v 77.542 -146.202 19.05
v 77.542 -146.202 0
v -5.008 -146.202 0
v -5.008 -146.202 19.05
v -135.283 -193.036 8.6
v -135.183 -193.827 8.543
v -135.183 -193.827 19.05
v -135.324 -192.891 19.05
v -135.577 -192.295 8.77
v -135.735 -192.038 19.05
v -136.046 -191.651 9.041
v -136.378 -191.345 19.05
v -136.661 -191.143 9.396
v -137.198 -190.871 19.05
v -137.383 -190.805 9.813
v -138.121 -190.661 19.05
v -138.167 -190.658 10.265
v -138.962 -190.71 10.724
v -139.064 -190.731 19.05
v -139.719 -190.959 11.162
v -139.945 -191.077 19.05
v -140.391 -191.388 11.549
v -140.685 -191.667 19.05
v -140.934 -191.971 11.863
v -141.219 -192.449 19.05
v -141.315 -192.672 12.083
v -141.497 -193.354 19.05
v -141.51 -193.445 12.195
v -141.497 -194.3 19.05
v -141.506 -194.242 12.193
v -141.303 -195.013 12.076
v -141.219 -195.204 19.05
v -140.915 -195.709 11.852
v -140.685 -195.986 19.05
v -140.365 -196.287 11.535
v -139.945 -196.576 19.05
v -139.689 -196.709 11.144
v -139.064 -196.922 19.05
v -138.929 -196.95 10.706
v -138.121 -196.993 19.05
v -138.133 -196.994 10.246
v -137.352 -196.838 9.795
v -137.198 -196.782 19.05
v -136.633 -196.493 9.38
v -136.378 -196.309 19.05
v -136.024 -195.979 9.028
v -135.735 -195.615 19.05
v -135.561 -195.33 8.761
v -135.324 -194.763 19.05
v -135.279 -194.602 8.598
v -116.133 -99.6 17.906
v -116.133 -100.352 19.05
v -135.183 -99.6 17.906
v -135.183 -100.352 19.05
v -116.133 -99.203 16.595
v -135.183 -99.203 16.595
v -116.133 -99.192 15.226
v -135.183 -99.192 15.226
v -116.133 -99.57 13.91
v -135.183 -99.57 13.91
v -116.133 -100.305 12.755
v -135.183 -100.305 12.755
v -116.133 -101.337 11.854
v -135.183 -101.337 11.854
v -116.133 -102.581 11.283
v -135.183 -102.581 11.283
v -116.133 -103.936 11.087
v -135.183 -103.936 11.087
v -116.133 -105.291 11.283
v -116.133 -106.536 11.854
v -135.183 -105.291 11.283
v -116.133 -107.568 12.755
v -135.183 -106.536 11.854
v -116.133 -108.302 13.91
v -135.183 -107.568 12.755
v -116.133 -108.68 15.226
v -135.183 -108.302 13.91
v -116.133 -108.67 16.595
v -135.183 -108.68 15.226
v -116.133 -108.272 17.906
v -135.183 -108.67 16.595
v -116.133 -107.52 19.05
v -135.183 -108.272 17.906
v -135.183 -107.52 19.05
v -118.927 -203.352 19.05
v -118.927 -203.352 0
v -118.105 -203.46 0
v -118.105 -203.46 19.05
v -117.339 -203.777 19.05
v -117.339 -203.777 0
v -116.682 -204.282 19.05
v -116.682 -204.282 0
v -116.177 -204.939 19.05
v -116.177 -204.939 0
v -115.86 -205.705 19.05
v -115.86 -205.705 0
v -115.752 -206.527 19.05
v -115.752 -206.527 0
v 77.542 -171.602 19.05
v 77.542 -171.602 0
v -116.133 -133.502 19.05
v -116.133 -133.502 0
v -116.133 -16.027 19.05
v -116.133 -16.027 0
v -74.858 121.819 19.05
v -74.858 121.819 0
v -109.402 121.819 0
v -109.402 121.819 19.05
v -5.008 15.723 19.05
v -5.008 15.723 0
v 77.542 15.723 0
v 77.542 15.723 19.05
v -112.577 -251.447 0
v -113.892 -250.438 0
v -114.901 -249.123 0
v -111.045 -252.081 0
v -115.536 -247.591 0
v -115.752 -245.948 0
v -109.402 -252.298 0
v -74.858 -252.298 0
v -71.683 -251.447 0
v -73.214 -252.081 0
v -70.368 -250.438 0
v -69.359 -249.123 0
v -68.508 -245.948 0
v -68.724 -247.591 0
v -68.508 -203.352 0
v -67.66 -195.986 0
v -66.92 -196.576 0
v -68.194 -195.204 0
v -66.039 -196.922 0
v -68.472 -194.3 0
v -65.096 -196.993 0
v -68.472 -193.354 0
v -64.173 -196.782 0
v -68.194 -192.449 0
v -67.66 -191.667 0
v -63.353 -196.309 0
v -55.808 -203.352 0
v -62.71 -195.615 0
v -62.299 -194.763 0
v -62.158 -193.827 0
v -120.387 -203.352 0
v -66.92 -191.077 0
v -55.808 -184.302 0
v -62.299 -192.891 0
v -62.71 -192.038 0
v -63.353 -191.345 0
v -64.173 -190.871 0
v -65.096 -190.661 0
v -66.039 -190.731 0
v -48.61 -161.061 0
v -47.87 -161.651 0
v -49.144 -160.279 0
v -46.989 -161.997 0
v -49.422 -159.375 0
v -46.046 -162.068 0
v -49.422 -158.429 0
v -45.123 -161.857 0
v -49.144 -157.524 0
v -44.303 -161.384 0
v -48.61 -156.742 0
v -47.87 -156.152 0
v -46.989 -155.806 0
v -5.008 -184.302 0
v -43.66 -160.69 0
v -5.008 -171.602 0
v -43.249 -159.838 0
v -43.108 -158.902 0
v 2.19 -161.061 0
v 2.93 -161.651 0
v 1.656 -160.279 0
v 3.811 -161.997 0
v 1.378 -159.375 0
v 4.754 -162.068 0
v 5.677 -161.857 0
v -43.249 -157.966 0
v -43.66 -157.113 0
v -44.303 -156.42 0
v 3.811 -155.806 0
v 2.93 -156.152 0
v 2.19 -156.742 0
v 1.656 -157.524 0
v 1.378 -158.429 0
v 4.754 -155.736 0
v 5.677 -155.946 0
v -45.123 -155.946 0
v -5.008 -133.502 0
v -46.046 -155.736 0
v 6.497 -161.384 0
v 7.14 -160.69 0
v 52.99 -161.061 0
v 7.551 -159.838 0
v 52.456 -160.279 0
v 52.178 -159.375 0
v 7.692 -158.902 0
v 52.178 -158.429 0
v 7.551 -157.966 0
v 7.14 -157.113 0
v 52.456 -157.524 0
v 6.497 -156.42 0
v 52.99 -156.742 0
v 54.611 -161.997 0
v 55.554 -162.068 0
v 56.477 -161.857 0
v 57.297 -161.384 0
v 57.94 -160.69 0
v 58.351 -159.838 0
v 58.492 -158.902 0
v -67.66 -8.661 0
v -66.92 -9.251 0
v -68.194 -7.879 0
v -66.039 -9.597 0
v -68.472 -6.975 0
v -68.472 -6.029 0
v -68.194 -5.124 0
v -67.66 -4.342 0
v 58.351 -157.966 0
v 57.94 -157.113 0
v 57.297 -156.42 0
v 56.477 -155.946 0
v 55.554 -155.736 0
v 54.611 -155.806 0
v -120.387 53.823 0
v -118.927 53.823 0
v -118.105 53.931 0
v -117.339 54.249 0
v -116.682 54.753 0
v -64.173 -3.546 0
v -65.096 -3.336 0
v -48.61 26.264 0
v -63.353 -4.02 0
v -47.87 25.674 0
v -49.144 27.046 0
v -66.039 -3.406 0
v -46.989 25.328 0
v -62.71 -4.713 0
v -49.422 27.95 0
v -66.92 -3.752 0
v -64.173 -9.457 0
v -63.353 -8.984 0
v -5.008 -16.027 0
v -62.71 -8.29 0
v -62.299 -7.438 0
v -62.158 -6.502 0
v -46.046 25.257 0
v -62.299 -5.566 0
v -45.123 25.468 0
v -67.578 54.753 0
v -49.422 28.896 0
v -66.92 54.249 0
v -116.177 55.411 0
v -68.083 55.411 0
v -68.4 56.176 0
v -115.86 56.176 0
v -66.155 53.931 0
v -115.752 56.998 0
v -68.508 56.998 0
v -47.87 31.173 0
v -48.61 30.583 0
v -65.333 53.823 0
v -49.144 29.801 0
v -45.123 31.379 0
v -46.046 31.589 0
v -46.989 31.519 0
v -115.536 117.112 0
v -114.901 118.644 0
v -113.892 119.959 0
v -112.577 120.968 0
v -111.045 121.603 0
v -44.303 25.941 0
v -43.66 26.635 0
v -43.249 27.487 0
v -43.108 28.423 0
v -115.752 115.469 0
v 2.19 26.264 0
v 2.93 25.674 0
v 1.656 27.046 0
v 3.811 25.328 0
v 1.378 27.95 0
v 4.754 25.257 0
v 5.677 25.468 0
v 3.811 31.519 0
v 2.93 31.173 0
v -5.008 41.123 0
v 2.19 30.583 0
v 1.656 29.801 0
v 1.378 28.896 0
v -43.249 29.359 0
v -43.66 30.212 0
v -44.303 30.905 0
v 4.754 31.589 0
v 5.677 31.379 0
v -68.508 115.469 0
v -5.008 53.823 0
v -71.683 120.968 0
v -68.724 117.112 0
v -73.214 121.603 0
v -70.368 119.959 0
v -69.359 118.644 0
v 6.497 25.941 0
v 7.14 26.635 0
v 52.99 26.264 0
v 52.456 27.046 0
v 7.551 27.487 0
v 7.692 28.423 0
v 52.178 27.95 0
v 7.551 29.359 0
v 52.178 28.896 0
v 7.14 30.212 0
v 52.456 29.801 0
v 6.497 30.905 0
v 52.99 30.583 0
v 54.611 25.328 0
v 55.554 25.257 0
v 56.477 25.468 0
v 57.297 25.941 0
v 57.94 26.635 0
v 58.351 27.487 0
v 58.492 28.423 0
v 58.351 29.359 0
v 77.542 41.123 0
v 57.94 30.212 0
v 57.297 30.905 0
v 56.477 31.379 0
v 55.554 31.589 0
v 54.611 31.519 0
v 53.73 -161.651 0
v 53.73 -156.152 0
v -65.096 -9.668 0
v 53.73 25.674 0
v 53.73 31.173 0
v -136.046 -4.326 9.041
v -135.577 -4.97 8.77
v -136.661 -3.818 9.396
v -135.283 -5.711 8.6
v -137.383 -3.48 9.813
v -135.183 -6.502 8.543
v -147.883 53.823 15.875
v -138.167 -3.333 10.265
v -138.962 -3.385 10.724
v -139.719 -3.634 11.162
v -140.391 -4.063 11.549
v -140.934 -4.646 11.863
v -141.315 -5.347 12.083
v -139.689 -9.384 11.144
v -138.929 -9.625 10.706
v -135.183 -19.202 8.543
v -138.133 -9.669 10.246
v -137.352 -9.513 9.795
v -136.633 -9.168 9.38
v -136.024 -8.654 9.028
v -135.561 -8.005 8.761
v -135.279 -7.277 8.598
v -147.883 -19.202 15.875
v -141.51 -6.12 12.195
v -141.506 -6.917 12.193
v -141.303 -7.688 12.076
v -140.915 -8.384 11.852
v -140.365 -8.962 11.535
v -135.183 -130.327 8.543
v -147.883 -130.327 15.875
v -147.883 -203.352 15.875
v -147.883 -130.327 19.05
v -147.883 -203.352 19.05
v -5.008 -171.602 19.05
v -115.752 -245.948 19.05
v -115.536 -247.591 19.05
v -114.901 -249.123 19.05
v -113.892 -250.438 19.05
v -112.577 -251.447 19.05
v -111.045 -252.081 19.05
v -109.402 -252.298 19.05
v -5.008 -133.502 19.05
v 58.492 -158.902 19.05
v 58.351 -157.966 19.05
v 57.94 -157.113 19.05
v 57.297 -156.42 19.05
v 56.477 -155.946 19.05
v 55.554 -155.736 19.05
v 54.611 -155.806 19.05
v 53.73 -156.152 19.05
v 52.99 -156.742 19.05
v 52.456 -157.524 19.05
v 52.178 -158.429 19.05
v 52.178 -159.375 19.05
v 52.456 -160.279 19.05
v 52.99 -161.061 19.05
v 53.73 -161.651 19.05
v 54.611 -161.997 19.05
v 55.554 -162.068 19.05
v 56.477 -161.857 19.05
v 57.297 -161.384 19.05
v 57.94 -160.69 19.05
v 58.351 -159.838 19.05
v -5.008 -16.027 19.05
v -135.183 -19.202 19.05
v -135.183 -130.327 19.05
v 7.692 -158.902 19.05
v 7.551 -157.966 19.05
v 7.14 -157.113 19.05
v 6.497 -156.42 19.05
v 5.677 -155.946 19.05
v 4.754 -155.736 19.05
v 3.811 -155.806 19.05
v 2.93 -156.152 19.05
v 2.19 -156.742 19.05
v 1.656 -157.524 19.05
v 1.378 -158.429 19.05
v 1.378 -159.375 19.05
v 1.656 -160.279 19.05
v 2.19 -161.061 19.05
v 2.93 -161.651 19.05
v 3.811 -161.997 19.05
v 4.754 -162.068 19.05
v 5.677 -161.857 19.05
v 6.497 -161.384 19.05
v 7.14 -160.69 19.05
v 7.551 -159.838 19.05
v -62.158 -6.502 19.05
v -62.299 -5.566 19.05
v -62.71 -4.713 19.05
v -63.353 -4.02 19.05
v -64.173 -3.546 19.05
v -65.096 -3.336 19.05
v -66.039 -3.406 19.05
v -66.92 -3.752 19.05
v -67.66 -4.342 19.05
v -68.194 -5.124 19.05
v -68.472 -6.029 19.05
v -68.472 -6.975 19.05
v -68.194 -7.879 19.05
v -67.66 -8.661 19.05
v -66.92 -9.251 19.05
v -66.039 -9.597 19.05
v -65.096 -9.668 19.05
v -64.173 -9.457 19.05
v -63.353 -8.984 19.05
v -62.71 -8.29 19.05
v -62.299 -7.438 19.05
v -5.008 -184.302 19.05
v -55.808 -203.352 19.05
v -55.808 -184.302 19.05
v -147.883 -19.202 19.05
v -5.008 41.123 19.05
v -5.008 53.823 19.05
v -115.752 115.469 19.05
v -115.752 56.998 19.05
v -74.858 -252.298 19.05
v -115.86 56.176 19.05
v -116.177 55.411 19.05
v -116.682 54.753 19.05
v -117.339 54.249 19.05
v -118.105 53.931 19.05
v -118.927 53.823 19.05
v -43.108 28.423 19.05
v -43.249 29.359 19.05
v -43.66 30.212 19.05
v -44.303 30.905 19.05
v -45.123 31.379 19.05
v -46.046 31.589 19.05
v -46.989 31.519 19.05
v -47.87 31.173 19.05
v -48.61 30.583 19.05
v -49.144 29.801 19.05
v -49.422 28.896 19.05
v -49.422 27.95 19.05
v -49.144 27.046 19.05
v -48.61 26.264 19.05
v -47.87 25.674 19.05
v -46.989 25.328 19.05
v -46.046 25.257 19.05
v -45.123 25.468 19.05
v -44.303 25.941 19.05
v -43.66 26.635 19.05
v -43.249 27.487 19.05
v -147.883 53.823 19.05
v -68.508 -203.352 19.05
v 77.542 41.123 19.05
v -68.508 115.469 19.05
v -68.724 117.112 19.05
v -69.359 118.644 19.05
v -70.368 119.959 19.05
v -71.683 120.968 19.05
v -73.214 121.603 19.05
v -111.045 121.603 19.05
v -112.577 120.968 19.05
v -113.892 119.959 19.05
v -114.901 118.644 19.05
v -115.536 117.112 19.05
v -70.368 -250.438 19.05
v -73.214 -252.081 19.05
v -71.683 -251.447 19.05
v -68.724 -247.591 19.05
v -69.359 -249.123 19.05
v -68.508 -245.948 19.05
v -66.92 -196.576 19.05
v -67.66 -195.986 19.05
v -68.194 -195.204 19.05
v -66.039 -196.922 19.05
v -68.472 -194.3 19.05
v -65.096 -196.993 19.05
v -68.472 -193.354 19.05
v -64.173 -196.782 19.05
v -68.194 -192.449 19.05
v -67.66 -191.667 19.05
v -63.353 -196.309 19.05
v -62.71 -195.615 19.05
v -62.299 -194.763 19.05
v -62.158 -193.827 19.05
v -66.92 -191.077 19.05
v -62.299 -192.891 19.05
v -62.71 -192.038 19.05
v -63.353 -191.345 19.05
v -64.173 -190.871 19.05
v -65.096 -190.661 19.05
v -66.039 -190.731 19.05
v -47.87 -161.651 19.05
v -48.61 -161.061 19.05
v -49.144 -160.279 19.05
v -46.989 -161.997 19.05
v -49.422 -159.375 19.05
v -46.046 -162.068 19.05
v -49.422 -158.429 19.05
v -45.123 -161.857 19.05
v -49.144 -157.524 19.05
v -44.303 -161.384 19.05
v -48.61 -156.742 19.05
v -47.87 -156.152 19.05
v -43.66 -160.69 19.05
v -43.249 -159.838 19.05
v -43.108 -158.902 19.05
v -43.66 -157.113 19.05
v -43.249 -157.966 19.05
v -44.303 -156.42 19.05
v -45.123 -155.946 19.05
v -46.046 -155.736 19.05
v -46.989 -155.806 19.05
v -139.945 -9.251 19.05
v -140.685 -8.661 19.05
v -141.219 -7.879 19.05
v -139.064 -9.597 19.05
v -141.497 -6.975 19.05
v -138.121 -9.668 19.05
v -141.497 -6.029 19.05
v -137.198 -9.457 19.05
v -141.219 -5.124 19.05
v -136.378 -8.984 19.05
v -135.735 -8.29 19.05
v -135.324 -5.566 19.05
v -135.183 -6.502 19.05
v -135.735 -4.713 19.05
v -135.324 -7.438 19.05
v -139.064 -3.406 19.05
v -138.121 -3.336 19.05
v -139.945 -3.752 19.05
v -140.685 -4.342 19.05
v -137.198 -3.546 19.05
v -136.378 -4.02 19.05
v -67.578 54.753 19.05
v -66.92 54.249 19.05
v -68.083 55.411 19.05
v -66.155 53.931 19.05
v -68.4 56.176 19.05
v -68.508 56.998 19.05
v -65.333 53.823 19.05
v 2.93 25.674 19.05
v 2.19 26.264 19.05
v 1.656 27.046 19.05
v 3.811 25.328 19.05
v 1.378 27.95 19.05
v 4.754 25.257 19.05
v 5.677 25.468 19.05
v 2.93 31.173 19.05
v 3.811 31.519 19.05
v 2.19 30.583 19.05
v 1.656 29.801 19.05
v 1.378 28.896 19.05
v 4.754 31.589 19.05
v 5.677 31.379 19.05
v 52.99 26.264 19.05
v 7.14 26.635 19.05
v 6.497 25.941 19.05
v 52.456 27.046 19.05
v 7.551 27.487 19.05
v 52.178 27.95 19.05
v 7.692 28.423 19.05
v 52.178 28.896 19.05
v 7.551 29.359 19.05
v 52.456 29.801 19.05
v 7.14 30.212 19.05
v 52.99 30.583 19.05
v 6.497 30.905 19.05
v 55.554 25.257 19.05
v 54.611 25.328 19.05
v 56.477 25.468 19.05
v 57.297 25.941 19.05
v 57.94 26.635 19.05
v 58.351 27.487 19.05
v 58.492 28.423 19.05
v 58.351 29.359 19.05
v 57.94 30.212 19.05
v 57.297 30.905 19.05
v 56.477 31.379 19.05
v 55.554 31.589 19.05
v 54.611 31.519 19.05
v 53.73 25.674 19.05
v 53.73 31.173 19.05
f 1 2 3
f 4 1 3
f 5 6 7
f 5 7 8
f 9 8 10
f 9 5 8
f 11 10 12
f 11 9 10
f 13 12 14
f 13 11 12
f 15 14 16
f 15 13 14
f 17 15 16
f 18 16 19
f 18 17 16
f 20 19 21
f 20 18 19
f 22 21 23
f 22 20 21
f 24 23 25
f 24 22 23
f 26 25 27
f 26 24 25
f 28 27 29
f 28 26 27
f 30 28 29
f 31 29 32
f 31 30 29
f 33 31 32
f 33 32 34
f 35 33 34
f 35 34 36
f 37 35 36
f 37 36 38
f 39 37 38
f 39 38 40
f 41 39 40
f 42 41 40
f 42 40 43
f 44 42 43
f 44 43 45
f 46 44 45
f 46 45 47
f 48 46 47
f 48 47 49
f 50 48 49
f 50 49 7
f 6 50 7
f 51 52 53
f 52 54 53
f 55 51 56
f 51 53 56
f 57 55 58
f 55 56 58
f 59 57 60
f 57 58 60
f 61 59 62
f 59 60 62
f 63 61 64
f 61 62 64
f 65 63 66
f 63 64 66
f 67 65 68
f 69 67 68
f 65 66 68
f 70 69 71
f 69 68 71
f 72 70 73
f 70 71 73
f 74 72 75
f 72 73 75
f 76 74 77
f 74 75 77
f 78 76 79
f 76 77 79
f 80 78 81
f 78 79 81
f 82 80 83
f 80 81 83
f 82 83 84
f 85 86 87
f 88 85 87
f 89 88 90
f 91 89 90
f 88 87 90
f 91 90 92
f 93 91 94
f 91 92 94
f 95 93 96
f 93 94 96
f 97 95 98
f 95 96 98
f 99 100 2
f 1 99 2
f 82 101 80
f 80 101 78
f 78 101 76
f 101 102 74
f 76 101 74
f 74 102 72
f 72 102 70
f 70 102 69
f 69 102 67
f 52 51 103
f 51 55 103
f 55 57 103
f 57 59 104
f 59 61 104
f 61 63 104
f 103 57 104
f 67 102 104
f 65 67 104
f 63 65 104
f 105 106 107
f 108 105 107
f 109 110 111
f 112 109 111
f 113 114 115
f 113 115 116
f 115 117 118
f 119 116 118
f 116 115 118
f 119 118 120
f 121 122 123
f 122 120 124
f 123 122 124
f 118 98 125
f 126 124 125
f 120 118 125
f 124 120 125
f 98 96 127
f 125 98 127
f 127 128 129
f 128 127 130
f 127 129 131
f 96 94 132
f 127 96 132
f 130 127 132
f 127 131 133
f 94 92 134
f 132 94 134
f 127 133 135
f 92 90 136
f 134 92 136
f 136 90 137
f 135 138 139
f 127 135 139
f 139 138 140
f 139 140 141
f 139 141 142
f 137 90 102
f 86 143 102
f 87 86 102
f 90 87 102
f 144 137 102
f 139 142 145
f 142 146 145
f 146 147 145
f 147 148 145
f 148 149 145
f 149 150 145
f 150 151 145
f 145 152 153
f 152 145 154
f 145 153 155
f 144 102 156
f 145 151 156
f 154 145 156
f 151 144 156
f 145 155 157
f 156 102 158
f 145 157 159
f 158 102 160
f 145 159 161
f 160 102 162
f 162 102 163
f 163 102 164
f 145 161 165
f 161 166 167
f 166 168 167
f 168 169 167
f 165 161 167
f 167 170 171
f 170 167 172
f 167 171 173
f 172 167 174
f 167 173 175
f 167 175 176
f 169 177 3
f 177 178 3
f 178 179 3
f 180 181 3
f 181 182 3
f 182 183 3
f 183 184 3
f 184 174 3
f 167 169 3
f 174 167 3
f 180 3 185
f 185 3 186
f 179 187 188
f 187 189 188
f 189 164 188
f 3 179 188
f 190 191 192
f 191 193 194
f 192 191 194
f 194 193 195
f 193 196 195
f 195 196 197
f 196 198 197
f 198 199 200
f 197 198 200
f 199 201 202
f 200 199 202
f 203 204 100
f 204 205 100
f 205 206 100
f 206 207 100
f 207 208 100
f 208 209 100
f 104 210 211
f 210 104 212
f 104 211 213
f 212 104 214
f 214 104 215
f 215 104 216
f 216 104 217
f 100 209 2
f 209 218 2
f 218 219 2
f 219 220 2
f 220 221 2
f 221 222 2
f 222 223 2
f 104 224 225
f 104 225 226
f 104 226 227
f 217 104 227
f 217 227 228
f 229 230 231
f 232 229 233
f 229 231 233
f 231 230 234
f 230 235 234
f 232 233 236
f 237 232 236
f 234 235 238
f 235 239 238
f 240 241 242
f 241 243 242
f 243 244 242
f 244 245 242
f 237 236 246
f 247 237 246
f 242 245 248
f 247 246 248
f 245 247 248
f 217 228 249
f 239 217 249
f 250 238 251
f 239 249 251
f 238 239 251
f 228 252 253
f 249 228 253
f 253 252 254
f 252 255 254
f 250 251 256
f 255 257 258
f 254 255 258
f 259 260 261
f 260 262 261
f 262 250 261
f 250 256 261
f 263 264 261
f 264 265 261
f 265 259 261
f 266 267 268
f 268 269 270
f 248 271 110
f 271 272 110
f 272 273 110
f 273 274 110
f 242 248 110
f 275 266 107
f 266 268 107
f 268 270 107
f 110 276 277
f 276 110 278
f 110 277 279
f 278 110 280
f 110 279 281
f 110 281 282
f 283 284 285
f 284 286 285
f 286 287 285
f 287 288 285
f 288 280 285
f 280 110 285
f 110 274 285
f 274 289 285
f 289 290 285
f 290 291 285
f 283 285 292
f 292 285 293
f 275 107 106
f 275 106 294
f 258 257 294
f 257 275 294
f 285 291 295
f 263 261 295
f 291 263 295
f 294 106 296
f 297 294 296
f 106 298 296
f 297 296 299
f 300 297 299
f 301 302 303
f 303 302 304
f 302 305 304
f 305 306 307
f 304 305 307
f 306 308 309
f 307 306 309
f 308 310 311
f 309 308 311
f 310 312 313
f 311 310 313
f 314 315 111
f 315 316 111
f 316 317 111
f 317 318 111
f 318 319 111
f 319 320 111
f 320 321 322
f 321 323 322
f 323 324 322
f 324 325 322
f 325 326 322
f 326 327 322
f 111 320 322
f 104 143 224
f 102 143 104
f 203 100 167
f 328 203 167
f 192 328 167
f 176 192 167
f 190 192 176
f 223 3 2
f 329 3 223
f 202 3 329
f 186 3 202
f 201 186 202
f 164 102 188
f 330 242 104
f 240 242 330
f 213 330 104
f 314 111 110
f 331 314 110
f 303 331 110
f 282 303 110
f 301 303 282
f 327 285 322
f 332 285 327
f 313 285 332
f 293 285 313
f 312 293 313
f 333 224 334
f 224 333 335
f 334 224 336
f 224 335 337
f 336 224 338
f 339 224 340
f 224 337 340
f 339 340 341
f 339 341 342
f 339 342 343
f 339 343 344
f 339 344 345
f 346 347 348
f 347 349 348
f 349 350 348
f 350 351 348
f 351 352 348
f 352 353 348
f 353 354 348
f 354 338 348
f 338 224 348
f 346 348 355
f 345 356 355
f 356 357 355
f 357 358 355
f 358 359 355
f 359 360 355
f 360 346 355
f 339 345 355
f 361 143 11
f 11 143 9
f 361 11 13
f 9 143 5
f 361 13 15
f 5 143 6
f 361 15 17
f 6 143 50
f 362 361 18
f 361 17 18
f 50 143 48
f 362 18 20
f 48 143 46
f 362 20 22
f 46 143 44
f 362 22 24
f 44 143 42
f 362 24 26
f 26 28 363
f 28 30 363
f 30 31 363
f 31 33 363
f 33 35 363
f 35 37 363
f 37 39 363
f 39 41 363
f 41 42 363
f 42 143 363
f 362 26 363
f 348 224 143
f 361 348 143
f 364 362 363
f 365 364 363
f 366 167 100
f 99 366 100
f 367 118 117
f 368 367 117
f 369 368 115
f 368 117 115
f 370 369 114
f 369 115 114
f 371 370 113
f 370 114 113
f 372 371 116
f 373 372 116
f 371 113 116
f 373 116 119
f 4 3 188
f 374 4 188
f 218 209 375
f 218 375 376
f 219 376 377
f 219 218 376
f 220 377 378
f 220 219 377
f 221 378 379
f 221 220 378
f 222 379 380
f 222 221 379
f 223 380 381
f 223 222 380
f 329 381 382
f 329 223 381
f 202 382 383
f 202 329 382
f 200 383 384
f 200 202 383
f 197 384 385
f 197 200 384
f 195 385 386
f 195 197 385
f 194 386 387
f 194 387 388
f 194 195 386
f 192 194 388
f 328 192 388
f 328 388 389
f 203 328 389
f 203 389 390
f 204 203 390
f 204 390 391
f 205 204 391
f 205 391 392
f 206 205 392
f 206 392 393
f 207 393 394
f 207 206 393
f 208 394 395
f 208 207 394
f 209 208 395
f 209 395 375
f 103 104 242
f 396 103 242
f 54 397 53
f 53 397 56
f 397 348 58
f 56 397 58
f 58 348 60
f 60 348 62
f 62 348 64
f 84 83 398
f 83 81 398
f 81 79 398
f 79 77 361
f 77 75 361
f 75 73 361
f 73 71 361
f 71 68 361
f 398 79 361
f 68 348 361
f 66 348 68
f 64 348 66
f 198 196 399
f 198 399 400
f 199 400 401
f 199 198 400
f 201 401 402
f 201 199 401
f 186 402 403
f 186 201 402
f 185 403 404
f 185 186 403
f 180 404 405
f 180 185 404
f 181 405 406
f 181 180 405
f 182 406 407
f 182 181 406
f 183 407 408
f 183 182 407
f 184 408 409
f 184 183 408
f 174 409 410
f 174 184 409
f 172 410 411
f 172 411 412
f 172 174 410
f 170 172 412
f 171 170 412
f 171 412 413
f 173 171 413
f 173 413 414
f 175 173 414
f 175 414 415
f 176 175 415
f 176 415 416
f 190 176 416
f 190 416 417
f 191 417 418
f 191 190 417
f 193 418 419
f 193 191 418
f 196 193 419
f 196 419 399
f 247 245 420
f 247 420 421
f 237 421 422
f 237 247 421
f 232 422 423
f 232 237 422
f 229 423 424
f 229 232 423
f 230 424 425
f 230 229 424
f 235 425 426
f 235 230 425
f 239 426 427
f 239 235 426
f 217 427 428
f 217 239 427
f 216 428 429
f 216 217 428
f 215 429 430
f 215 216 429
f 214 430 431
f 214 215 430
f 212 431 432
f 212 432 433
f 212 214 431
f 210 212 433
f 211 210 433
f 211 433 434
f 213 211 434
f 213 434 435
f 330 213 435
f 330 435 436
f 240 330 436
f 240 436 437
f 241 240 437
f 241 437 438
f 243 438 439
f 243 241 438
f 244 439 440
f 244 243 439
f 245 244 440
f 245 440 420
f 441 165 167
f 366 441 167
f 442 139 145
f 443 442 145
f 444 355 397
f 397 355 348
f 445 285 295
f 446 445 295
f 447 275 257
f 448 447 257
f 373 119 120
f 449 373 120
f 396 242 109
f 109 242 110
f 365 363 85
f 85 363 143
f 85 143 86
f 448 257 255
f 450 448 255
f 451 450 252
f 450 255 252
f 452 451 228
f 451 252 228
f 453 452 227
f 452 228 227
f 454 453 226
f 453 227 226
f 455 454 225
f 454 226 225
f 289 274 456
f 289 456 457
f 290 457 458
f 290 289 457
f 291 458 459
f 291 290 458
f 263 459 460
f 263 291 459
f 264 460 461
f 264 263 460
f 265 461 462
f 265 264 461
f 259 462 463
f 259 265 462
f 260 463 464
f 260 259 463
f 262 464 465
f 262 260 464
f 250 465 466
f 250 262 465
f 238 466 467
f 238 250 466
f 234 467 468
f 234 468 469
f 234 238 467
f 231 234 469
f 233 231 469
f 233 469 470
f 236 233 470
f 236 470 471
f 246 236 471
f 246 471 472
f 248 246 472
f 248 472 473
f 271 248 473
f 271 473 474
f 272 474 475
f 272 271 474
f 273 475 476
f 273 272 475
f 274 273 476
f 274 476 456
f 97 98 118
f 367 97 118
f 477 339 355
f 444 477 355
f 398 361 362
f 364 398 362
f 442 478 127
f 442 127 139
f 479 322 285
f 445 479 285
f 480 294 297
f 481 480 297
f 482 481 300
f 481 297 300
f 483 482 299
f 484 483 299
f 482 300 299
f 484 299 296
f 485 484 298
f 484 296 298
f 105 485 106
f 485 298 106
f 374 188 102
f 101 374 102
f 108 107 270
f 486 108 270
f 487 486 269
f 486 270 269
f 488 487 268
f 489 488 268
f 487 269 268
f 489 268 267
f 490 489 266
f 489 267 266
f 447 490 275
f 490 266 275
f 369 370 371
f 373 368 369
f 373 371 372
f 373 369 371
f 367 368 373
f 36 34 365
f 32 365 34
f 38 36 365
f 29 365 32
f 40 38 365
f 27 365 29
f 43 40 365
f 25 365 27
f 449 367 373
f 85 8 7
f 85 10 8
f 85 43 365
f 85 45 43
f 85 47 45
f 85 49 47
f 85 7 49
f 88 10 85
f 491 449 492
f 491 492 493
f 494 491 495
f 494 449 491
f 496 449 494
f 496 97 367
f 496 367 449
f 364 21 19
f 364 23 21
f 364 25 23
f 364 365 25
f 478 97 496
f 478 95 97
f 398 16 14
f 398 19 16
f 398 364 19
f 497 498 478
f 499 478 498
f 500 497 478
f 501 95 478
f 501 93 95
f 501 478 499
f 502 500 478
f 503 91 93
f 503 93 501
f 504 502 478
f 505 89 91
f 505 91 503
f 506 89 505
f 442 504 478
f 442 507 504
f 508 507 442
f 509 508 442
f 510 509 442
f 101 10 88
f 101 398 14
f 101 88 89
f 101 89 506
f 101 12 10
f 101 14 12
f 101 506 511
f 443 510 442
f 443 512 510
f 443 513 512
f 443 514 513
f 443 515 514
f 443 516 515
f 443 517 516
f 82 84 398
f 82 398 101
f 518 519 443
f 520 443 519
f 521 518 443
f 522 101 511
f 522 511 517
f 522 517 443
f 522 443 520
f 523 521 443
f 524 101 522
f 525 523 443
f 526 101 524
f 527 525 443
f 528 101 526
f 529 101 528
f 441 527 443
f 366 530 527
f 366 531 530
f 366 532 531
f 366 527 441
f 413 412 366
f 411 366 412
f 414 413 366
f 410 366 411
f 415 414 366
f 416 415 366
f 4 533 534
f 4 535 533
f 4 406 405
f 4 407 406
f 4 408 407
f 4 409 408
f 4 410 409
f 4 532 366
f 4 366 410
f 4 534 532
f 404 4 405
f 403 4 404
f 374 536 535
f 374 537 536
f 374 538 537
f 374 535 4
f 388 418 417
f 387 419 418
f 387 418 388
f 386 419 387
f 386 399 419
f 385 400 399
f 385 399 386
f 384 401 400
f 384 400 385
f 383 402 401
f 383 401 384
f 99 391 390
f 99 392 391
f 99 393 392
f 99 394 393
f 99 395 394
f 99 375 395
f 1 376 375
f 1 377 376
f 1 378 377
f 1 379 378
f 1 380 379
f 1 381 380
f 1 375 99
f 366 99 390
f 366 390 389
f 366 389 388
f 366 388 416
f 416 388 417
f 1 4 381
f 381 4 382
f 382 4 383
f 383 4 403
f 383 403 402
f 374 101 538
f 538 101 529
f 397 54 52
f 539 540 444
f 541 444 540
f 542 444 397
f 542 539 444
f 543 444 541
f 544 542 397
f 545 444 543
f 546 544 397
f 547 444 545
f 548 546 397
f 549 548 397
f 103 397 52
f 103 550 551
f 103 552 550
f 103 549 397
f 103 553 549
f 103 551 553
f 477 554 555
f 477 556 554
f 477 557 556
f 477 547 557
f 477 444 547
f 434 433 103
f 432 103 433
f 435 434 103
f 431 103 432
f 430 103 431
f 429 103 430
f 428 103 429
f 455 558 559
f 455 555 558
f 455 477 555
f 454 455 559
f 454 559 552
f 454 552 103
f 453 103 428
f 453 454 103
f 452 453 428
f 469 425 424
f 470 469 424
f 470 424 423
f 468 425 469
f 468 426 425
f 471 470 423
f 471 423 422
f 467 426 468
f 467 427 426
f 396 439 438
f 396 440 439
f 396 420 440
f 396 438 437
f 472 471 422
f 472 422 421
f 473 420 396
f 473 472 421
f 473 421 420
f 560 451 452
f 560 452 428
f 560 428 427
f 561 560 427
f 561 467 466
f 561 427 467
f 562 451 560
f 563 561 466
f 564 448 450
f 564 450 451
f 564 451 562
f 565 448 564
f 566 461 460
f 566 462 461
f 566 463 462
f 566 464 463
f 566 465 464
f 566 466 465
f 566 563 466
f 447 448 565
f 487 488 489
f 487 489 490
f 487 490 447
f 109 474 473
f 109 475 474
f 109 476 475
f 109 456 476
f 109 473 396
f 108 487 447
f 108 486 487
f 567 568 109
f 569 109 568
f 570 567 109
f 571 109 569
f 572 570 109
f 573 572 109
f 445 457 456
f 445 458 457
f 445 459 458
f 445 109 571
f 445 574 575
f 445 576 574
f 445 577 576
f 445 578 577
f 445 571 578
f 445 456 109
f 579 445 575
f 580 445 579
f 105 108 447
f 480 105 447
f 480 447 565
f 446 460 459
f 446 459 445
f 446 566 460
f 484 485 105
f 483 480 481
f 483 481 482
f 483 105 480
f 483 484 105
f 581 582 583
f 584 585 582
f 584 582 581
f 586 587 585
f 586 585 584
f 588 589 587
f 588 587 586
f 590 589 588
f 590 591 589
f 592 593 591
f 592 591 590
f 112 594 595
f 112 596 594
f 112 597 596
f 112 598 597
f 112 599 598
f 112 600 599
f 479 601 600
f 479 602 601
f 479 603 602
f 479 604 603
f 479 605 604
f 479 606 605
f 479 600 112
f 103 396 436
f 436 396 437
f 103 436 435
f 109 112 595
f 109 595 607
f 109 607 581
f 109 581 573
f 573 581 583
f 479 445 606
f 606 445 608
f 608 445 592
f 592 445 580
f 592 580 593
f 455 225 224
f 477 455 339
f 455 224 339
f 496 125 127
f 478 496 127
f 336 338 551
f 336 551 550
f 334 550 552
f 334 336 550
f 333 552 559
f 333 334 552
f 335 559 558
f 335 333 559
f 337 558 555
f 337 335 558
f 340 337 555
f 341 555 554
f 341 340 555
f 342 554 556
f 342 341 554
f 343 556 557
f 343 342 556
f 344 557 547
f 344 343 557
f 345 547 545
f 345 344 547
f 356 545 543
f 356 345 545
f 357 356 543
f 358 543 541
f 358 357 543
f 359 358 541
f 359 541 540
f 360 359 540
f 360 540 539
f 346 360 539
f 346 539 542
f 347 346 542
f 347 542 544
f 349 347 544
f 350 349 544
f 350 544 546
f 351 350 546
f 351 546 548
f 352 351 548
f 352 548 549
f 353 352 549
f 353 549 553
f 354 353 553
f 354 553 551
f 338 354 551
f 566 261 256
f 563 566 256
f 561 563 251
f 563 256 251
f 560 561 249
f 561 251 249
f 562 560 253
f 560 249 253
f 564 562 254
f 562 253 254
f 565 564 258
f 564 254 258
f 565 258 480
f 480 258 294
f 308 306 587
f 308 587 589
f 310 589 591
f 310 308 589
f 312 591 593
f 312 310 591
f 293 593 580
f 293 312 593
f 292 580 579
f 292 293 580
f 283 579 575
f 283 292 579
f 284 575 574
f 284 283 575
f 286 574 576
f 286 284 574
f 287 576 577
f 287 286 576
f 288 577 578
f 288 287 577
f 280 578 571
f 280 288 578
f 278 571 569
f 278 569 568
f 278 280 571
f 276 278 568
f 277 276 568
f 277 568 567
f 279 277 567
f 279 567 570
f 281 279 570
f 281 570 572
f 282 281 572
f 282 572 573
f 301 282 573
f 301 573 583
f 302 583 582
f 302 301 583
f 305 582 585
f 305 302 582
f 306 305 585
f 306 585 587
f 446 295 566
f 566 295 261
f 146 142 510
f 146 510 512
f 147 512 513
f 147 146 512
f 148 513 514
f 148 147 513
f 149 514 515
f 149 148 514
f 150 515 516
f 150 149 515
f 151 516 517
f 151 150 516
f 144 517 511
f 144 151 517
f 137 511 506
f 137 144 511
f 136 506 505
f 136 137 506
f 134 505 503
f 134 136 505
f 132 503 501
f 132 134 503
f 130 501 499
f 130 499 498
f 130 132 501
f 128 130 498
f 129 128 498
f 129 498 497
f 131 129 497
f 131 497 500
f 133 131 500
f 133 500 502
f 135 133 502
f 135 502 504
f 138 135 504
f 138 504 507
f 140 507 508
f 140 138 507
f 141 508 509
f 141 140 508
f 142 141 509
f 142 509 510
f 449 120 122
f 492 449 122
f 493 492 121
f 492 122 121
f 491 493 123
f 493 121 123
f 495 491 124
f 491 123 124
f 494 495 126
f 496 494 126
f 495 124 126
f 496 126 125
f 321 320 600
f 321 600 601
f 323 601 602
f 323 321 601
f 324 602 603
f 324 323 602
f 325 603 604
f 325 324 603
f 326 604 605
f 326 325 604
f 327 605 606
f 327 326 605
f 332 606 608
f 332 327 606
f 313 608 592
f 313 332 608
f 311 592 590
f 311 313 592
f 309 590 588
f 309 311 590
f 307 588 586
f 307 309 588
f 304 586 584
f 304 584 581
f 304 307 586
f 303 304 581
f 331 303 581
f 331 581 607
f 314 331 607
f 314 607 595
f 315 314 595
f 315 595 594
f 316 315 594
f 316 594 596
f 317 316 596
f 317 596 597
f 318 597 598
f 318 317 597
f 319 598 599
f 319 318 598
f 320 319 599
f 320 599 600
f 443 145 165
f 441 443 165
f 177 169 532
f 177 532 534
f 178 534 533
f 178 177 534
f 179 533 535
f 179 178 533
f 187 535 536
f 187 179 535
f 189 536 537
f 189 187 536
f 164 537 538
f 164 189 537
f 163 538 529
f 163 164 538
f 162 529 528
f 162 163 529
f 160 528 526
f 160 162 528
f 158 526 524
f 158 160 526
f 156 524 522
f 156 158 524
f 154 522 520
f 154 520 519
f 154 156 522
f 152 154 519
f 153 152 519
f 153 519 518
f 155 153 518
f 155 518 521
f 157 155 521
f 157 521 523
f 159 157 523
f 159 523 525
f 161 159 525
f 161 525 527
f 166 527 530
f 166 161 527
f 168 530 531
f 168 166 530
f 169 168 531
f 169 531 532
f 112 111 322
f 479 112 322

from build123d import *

# Parameters (mm, degrees)
F0_R     = 3.175
F1_DEPTH = 19.05
F2_R     = 4.7879
F3_DEPTH = 50.8
F5_DEPTH = 279.4


# Not quite as in the source:
# - a feature names something its author has since deleted; it is built from what else it names


with BuildPart() as f1:
    # F0 (on Top) → F1 (new body)
    with BuildSketch(Plane.XY):
        with BuildLine():
            Line((-118.9269337424, 53.8231658584), (-147.8829337424, 53.8231658584))
            Line((-147.8829337424, 53.8231658584), (-147.8829337424, -16.0268341416))
            Line((-147.8829337424, -16.0268341416), (-147.8829337424, -19.2018341416))
            Line((-147.8829337424, -19.2018341416), (-135.1829337424, -19.2018341416))
            Line((-135.1829337424, -19.2018341416), (-135.1829337424, -130.3268341416))
            Line((-135.1829337424, -130.3268341416), (-147.8829337424, -130.3268341416))
            Line((-147.8829337424, -130.3268341416), (-147.8829337424, -136.6768341416))
            Line((-147.8829337424, -136.6768341416), (-147.8829337424, -171.6018341416))
            Line((-147.8829337424, -171.6018341416), (-147.8829337424, -203.3518341416))
            Line((-147.8829337424, -203.3518341416), (-118.9269337424, -203.3518341416))
            ThreePointArc((-118.9269337424, -203.3518341416), (-116.6818697121, -204.2817701113), (-115.7519337424, -206.5268341416))
            Line((-115.7519337424, -206.5268341416), (-115.7519337424, -245.9476341416))
            ThreePointArc((-115.7519337424, -245.9476341416), (-113.8920618029, -250.4377622021), (-109.4019337424, -252.2976341416))
            Line((-109.4019337424, -252.2976341416), (-74.8579337424, -252.2976341416))
            ThreePointArc((-74.8579337424, -252.2976341416), (-70.3678056819, -250.4377622021), (-68.5079337424, -245.9476341416))
            Line((-68.5079337424, -245.9476341416), (-68.5079337424, -203.3518341416))
            Line((-68.5079337424, -203.3518341416), (-55.8079337424, -203.3518341416))
            Line((-55.8079337424, -203.3518341416), (-55.8079337424, -184.3018341416))
            Line((-55.8079337424, -184.3018341416), (-5.0079337424, -184.3018341416))
            Line((-5.0079337424, -184.3018341416), (-5.0079337424, -171.6018341416))
            Line((-5.0079337424, -171.6018341416), (77.5420662576, -171.6018341416))
            Line((77.5420662576, -171.6018341416), (77.5420662576, -146.2018341416))
            Line((77.5420662576, -146.2018341416), (-5.0079337424, -146.2018341416))
            Line((-5.0079337424, -146.2018341416), (-5.0079337424, -133.5018341416))
            Line((-5.0079337424, -133.5018341416), (-27.2329337424, -133.5018341416))
            Line((-27.2329337424, -133.5018341416), (-116.1329337424, -133.5018341416))
            Line((-116.1329337424, -133.5018341416), (-116.1329337424, -16.0268341416))
            Line((-116.1329337424, -16.0268341416), (-22.9684459845, -16.0268341416))
            Line((-22.9684459845, -16.0268341416), (-5.0079337424, -16.0268341416))
            Line((-5.0079337424, -16.0268341416), (-5.0079337424, -7.9982466186))
            Line((-5.0079337424, -7.9982466186), (-5.0079337424, 15.7231658584))
            Line((-5.0079337424, 15.7231658584), (77.5420662576, 15.7231658584))
            Line((77.5420662576, 15.7231658584), (77.5420662576, 41.1231658584))
            Line((77.5420662576, 41.1231658584), (-5.0079337424, 41.1231658584))
            Line((-5.0079337424, 41.1231658584), (-5.0079337424, 53.8231658584))
            Line((-5.0079337424, 53.8231658584), (-65.3329337424, 53.8231658584))
            ThreePointArc((-65.3329337424, 53.8231658584), (-67.5779977727, 54.7531018282), (-68.5079337424, 56.9981658584))
            Line((-68.5079337424, 56.9981658584), (-68.5079337424, 115.4689658584))
            ThreePointArc((-68.5079337424, 115.4689658584), (-70.3678056819, 119.959093919), (-74.8579337424, 121.8189658584))
            Line((-74.8579337424, 121.8189658584), (-109.4019337424, 121.8189658584))
            ThreePointArc((-109.4019337424, 121.8189658584), (-113.8920618029, 119.959093919), (-115.7519337424, 115.4689658584))
            Line((-115.7519337424, 115.4689658584), (-115.7519337424, 56.9981658584))
            ThreePointArc((-115.7519337424, 56.9981658584), (-116.6818697121, 54.7531018282), (-118.9269337424, 53.8231658584))
        make_face()
        with Locations((-138.3579337424, -193.8268341416)):
            Circle(F0_R, mode=Mode.SUBTRACT)
        with Locations((-65.3329337424, -193.8268341416)):
            Circle(F0_R, mode=Mode.SUBTRACT)
        with Locations((-46.2829337424, -158.9018341416)):
            Circle(F0_R, mode=Mode.SUBTRACT)
        with Locations((4.5170662576, -158.9018341416)):
            Circle(F0_R, mode=Mode.SUBTRACT)
        with Locations((55.3170662576, -158.9018341416)):
            Circle(F0_R, mode=Mode.SUBTRACT)
        with Locations((-138.3579337424, -6.5018341416)):
            Circle(F0_R, mode=Mode.SUBTRACT)
        with Locations((-65.3329337424, -6.5018341416)):
            Circle(F0_R, mode=Mode.SUBTRACT)
        with Locations((-46.2829337424, 28.4231658584)):
            Circle(F0_R, mode=Mode.SUBTRACT)
        with Locations((4.5170662576, 28.4231658584)):
            Circle(F0_R, mode=Mode.SUBTRACT)
        with Locations((55.3170662576, 28.4231658584)):
            Circle(F0_R, mode=Mode.SUBTRACT)
    extrude(amount=F1_DEPTH)

    # F2 (on face) → F3 (cut)
    with BuildSketch(Plane(origin=(-147.8829337424, 0, 0), x_dir=(0, -1, 0), z_dir=(-1, 0, 0))):
        with Locations((103.9362341416, 15.875)):
            Circle(F2_R)
    extrude(amount=-F3_DEPTH, mode=Mode.SUBTRACT)

    # F4 (on face) → F5 (cut)
    with BuildSketch(Plane.XZ.offset(203.3518341416)):
        Polygon((-120.3866271722, 0), (-147.8829337424, 15.875), (-147.8829337424, 0), align=None)
    extrude(amount=-F5_DEPTH, mode=Mode.SUBTRACT)


solid = f1.part
